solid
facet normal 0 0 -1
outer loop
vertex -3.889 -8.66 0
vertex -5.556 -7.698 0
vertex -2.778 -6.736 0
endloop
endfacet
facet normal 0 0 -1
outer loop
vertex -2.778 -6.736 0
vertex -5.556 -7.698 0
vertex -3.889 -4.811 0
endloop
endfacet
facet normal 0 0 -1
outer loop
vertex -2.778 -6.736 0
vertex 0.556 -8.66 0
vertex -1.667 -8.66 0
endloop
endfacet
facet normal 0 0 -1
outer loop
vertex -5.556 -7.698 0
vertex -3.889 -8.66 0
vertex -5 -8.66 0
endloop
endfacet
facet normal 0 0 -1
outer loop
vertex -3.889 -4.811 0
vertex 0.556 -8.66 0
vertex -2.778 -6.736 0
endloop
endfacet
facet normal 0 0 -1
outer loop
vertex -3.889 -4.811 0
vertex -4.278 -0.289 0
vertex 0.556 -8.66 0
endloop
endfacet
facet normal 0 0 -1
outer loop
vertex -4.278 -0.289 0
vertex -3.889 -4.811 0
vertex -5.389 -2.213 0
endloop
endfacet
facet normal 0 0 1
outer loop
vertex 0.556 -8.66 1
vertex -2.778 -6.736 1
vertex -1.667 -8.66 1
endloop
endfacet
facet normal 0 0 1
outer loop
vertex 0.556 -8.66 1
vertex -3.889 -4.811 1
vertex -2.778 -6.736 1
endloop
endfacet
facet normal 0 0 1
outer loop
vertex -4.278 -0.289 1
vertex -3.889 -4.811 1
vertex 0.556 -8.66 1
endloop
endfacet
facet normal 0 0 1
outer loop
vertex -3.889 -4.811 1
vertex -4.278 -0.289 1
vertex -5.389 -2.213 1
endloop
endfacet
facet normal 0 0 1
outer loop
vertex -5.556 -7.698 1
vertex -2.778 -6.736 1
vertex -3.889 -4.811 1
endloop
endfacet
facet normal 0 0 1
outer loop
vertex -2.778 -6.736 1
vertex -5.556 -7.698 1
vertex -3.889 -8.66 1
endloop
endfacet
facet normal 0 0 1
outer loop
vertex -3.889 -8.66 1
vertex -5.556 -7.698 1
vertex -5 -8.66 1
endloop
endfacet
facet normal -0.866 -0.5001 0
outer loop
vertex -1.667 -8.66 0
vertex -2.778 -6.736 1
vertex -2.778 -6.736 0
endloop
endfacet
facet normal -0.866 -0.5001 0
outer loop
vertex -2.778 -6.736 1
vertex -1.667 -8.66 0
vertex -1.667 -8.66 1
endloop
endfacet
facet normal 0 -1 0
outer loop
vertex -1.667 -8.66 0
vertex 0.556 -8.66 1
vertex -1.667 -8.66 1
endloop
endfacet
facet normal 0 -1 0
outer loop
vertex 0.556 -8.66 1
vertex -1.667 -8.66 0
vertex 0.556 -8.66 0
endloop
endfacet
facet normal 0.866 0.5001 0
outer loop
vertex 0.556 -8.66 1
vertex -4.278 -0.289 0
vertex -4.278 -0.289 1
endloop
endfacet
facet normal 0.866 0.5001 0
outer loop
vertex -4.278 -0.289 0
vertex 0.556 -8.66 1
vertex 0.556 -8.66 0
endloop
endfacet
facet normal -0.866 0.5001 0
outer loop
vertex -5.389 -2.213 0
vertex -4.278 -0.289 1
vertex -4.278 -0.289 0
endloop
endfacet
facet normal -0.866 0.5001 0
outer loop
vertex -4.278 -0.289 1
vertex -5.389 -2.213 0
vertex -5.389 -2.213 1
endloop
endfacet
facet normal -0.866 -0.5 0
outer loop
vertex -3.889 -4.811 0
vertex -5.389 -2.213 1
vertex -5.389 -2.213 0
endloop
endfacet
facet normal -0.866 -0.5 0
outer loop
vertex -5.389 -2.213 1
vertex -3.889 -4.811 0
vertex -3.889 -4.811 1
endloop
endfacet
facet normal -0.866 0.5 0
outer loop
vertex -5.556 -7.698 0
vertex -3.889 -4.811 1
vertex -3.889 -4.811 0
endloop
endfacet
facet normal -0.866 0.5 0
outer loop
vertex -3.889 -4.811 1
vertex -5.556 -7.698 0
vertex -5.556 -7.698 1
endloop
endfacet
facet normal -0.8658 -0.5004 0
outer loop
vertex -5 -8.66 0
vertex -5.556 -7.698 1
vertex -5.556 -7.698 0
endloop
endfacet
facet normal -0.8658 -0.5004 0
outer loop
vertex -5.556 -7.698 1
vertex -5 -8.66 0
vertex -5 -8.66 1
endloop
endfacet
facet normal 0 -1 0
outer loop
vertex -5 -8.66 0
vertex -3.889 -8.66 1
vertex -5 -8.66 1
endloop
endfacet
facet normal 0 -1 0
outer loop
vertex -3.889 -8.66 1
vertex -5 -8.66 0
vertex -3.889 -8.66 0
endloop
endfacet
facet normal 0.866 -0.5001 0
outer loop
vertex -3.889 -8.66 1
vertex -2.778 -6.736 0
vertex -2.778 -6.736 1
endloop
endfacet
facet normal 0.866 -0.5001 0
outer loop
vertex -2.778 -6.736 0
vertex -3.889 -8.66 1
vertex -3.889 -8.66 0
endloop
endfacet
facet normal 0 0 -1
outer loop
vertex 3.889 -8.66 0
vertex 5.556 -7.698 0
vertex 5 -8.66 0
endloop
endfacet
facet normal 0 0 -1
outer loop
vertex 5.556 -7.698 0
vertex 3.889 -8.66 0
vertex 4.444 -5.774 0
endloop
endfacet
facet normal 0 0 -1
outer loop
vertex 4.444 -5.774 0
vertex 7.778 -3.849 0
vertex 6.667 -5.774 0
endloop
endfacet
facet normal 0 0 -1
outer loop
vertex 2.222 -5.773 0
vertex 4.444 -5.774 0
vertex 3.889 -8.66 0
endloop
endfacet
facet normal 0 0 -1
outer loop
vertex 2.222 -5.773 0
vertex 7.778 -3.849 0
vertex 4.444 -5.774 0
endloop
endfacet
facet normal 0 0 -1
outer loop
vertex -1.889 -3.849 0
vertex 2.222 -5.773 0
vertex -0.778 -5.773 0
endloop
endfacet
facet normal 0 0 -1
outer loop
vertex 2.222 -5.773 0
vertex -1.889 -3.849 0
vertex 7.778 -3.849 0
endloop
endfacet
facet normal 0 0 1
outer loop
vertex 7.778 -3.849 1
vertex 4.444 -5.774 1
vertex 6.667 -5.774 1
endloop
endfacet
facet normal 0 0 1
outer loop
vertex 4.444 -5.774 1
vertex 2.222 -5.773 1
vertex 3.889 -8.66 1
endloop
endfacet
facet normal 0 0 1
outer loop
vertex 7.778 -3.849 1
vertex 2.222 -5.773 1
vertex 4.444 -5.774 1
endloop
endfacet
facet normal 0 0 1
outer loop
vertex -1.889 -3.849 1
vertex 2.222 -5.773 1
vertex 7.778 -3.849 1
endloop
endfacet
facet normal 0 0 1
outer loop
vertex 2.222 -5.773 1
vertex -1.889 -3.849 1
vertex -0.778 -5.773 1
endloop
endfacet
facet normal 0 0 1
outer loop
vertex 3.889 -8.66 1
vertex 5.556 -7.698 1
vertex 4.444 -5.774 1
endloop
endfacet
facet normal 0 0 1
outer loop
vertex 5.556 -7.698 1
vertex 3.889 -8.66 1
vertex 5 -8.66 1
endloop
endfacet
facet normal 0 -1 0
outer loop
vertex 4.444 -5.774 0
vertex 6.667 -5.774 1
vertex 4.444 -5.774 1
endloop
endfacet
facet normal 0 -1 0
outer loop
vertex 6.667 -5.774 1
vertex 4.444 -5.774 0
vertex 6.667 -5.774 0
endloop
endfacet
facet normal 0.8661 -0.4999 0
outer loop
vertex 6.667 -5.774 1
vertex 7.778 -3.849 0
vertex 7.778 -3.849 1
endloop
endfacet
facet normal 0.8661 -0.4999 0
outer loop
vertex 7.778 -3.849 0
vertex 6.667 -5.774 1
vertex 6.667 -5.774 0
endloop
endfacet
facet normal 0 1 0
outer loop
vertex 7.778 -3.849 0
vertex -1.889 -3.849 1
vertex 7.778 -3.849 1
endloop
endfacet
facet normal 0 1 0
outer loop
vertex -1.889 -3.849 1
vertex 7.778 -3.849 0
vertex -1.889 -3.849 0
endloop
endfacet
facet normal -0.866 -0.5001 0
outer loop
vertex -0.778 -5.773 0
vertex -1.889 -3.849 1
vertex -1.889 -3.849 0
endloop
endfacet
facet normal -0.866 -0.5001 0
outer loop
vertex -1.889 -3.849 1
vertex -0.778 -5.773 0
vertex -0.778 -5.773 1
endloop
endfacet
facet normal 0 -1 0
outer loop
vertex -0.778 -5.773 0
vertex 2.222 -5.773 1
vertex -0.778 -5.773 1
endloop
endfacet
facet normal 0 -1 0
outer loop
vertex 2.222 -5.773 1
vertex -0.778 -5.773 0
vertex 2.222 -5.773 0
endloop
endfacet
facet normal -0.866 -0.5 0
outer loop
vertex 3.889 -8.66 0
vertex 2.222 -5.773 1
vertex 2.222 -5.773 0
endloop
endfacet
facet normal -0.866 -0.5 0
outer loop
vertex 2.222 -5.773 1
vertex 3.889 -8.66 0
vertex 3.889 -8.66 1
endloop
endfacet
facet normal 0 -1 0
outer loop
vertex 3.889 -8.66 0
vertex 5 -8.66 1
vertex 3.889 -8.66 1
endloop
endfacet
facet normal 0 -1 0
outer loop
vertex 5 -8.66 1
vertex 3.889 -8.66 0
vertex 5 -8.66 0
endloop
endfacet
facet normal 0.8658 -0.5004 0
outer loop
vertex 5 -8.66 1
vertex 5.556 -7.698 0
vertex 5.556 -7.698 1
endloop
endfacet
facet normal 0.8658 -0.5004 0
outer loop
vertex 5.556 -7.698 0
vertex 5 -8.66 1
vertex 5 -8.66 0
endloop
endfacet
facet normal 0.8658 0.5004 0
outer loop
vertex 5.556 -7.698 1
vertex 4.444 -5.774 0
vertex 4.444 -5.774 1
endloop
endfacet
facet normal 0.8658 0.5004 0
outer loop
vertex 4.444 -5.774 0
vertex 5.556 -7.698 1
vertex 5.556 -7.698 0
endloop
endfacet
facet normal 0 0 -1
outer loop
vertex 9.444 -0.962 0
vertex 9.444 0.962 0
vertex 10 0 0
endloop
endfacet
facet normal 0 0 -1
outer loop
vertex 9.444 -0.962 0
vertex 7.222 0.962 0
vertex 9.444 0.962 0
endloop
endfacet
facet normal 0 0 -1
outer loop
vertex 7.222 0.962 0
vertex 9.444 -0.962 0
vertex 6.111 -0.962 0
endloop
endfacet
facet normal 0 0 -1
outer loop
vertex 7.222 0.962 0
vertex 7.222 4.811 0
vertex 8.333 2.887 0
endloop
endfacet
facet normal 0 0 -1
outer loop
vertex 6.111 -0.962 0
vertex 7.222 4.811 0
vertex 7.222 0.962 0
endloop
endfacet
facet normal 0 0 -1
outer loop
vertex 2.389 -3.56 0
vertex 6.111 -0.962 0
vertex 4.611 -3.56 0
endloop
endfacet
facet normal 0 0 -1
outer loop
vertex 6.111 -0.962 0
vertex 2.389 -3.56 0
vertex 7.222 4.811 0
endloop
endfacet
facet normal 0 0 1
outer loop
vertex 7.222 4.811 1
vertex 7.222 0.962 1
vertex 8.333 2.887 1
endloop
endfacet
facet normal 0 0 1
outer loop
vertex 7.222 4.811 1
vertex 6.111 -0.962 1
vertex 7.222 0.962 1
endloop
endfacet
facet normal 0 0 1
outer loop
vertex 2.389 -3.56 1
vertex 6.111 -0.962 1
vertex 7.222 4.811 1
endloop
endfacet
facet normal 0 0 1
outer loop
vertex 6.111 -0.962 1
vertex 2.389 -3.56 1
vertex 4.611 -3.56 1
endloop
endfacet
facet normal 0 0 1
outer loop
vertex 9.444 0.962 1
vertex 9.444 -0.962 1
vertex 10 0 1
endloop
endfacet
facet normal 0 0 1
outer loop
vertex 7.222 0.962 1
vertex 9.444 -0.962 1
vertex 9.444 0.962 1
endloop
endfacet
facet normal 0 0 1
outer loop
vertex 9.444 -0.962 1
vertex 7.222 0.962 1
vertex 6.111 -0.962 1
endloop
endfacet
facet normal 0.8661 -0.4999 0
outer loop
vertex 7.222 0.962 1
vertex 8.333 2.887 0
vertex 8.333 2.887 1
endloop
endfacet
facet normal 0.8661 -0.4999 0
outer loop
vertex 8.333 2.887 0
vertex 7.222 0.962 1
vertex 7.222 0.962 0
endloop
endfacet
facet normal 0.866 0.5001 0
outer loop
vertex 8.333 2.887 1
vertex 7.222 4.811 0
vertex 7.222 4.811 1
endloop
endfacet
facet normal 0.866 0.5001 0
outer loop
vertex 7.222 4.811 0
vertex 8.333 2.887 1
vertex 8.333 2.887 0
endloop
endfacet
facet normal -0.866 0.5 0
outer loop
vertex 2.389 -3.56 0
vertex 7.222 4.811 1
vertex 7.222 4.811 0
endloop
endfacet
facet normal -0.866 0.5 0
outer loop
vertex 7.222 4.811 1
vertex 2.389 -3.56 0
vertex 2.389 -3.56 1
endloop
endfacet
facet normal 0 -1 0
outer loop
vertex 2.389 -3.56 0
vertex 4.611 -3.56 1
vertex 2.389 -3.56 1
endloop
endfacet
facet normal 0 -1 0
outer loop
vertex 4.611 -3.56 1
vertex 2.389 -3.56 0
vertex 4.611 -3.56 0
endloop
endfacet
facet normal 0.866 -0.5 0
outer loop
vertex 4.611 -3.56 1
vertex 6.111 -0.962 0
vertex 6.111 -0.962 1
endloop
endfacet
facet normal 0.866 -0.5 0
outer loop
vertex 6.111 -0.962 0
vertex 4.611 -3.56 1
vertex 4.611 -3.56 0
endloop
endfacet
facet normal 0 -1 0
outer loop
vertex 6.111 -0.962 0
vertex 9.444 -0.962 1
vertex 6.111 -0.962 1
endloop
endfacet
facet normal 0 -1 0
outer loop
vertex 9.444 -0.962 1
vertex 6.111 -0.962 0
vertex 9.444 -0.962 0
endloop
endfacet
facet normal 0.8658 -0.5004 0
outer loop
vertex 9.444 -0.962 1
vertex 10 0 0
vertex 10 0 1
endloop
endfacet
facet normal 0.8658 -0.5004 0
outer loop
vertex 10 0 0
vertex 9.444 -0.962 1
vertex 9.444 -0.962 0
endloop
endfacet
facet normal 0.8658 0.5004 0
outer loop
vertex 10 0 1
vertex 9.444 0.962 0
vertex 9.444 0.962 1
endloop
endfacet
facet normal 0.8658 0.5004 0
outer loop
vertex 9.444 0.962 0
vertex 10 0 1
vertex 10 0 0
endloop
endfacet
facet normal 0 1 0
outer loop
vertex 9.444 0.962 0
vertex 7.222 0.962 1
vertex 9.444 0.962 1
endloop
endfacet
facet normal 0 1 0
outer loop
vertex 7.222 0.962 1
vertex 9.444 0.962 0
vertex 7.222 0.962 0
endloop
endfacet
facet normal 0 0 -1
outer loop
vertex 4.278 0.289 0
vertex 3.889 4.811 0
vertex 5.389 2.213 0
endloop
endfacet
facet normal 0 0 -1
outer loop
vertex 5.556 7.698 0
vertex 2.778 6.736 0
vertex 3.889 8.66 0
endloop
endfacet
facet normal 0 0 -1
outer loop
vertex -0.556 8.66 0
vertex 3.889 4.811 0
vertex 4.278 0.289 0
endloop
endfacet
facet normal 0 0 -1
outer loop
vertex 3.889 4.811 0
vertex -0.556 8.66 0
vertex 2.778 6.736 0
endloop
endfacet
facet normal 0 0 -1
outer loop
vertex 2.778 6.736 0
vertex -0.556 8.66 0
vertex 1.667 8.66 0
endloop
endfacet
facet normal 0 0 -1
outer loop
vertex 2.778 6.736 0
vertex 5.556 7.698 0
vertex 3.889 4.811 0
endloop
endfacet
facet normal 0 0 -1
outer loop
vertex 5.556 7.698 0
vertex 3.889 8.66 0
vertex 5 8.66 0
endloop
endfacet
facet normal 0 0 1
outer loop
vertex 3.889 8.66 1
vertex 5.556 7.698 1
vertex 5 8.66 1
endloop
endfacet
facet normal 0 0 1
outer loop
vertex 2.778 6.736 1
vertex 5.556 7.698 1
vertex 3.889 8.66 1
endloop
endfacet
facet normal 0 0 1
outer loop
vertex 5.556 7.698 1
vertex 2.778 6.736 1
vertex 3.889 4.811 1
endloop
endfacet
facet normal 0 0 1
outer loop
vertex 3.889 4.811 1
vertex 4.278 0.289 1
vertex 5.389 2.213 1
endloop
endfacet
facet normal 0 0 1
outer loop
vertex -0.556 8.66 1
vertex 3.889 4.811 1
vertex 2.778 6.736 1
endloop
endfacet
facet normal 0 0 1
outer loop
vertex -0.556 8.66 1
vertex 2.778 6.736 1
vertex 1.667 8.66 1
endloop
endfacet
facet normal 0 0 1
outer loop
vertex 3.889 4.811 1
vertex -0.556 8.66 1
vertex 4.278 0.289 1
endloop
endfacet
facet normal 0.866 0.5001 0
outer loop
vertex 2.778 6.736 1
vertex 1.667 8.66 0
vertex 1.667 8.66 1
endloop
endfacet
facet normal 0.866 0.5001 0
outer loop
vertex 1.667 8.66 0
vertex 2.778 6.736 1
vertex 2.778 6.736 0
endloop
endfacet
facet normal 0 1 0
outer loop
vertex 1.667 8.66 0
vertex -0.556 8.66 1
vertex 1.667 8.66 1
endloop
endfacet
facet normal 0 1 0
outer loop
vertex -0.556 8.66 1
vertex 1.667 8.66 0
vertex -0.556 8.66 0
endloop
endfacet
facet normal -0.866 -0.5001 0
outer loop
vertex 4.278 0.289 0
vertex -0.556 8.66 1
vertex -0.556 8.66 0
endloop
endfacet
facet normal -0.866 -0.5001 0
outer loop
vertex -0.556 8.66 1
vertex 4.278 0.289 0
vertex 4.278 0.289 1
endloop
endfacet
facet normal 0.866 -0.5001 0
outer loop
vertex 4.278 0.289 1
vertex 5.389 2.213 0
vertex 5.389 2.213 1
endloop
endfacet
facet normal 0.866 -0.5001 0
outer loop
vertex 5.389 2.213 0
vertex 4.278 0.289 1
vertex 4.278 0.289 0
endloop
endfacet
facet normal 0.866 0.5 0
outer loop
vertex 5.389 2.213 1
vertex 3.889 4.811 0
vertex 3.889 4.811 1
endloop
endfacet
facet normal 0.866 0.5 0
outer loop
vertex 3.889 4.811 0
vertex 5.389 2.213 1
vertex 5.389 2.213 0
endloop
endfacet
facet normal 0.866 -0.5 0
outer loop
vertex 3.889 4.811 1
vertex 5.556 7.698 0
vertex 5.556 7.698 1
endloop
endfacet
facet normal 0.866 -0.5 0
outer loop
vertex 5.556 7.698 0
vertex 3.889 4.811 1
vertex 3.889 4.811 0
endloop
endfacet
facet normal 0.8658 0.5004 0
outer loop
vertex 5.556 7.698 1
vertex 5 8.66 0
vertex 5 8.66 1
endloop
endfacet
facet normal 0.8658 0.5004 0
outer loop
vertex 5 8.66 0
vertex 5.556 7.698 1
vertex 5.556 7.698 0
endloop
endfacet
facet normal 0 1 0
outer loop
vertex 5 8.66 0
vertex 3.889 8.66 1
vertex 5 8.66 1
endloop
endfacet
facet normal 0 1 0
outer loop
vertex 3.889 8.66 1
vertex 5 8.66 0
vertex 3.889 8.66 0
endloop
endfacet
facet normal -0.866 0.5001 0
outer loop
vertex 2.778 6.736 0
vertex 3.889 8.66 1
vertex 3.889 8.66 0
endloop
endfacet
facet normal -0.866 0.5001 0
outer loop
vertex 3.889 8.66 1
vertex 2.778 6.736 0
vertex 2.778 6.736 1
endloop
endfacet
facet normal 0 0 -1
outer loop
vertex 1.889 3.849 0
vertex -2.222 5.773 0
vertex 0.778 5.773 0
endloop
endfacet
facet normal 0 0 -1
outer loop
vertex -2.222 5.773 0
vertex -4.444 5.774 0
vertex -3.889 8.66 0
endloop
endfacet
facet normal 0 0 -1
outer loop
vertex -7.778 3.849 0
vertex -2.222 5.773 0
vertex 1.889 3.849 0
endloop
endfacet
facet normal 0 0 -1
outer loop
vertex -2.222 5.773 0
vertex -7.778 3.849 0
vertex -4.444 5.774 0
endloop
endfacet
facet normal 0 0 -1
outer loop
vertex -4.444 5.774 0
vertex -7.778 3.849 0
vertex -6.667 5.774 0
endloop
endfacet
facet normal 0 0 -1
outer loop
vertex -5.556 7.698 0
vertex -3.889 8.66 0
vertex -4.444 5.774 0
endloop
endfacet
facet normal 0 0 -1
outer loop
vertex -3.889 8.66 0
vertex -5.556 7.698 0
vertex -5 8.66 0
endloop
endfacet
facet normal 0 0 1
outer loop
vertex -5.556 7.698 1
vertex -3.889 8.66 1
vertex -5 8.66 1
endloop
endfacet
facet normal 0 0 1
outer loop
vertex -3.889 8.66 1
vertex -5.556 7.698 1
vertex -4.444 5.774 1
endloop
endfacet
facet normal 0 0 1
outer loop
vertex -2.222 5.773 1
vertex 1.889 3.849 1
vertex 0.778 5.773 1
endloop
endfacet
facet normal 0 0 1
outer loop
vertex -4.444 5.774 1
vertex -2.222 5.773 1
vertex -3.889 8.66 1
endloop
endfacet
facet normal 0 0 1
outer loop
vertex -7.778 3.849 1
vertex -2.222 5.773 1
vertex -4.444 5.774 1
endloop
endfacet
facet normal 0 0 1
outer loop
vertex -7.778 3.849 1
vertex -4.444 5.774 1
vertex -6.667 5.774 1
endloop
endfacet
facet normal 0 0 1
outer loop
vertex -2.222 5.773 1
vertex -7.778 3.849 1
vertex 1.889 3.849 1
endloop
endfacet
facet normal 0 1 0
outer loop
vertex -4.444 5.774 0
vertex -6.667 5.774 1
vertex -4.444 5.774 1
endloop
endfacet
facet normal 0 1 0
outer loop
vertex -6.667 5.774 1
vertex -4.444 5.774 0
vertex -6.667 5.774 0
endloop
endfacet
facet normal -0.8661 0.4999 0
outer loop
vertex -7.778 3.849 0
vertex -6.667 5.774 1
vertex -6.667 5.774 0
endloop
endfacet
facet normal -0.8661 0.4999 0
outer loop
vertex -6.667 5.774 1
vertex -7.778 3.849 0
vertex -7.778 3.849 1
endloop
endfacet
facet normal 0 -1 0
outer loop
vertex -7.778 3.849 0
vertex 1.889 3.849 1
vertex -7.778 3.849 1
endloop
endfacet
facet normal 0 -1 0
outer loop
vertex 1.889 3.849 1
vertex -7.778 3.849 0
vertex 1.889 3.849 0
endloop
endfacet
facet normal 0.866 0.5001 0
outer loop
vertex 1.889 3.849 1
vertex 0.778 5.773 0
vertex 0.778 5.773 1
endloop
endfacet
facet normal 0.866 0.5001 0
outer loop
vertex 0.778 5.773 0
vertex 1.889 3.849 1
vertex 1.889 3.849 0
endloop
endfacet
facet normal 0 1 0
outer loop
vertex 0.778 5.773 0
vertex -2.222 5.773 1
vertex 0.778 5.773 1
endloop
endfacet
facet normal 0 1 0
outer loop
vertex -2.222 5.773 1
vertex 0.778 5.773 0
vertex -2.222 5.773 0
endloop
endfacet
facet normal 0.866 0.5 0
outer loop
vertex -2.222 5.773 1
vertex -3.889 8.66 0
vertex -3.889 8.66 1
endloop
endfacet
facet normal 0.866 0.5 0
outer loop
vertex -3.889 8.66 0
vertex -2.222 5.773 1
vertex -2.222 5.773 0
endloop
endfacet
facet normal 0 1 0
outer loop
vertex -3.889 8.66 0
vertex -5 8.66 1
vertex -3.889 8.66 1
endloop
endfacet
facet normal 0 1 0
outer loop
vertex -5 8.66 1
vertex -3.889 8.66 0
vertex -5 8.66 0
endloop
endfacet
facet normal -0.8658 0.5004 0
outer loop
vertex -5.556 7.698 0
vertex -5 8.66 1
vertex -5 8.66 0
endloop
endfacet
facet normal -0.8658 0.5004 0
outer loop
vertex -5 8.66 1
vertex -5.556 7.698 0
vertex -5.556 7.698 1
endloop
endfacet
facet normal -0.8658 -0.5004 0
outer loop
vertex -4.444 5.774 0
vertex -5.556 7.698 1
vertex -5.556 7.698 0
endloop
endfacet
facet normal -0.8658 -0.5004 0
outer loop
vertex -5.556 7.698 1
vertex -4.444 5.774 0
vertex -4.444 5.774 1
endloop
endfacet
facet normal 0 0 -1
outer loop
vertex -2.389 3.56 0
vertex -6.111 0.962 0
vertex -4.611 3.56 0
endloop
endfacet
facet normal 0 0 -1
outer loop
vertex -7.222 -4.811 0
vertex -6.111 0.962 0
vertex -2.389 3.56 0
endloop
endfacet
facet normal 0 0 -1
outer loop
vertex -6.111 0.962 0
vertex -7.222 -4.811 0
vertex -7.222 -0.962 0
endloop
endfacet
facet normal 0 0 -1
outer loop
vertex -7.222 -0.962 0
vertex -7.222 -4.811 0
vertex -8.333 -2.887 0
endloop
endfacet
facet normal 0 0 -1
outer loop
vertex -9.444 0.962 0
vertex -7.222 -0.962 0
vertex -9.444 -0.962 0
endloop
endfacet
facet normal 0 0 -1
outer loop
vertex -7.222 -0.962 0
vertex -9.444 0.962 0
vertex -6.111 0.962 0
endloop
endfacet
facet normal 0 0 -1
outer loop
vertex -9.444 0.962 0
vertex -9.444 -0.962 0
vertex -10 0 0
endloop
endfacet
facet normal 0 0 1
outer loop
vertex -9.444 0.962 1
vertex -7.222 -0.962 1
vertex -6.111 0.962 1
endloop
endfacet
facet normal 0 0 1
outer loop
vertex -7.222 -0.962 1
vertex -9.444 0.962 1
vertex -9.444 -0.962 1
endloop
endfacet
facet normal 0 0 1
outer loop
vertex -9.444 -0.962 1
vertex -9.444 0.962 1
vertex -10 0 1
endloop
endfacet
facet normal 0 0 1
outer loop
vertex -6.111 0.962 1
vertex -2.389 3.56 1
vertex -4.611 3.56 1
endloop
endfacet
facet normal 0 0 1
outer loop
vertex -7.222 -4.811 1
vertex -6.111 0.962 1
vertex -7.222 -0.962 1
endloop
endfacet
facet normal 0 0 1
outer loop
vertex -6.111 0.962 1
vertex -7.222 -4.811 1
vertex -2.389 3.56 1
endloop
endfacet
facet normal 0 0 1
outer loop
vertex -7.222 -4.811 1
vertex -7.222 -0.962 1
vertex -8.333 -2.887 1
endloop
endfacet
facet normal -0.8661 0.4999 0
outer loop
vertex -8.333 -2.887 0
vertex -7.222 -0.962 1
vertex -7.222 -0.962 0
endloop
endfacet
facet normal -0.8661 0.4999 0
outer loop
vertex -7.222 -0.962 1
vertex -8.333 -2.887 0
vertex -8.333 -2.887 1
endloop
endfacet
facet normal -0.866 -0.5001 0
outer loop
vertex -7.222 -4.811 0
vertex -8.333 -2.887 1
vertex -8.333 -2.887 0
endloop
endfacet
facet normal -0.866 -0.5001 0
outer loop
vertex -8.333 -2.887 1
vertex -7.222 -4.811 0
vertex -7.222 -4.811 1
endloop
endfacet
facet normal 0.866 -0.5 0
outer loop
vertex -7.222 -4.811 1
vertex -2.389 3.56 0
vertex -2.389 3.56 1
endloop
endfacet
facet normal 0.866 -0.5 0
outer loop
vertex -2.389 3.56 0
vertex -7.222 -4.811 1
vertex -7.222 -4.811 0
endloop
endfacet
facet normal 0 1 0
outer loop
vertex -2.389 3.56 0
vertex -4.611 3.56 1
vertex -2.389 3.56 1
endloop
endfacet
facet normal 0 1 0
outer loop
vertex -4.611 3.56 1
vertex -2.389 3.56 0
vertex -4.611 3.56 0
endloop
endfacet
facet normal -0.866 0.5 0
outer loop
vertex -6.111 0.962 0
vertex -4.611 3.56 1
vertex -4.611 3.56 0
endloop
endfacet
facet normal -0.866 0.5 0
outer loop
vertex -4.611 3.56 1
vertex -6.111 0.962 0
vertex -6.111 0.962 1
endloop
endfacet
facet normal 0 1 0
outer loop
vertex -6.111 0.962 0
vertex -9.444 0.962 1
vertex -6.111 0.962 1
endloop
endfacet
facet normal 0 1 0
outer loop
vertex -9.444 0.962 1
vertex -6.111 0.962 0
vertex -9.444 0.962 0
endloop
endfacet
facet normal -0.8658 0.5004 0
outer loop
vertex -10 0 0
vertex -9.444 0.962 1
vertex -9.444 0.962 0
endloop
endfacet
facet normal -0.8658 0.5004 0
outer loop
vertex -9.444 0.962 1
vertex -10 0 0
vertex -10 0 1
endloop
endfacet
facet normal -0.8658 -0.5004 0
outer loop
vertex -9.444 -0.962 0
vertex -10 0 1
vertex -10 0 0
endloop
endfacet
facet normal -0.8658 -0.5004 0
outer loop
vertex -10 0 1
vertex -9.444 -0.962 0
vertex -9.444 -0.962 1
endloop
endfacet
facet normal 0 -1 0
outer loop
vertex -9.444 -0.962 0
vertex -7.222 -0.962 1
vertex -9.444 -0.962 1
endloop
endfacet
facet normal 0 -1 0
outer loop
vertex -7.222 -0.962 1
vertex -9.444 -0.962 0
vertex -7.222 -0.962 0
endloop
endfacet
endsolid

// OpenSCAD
unit = [1, 0];
origin = [0, 0];


/*
    Returns a 2D rotation matrix given an angle.
*/
function rot2d(angle) = [
    [+cos(angle), -sin(angle)],
    [+sin(angle), +cos(angle)]
];


/*
    Calculates the points for a hexagon.
    Used to reference off of for creating the lambda.
    Points are created starting from the right and moving counter-clockwise.

         2   1

      3         0

         4   5
*/
function inner_hex_points(data) = [
    for (angle = [0 : 60 : 300]) 
    dict_get(data, "scale") * rot2d(angle) * unit
];



/*
    Calculates the points for making a lambda.

    Returns two a list of two lists.
    The first list contains the offset for making a flake.
    The second list is used to form the lambda polygon.
*/
function lambda_points(data) =
let (
    hex_points = inner_hex_points(data),
    thickness = dict_get(data, "thickness") / 2,
    top_left = hex_points[2],
    bottom_left = hex_points[4],
    bottom_right = hex_points[5],
    v_0 = thickness * unit,
    v_p60 = thickness * rot2d(60) * unit,
    v_n60 = thickness * rot2d(-60) * unit,
    v_n90 = thickness * rot2d(-90) * unit,
    gap = dict_get(data, "gap") * rot2d(-60) * unit
)
[
    [
        top_left + v_p60,
    ],
    [
        top_left - v_p60 + gap,
        top_left + v_p60 + gap,
        bottom_right + v_0,
        bottom_right - v_0,
        sqrt(3) * v_n90,
        bottom_left + v_0,
        bottom_left,
        bottom_left - v_n60,
        -v_0
    ]
];


/*
    Generates a single lambda at the origin.
*/
module lambda(data) {
    new_data = update_params(data);
    linear_extrude(dict_get(new_data, "height"))
    polygon(lambda_points(new_data)[1]);
}


/*
    Generates a NixOS flake.
*/
module flake(data) {
    new_data = update_params(data);
    for (idx = [0 : 5]) {
        rotate([0, 0, idx * 60]) 
        translate(-lambda_points(new_data)[0][0])
        translate([-dict_get(new_data, "scale"), 0, 0])
        linear_extrude(dict_get(new_data, "height"))
        polygon(lambda_points(new_data)[1]);
    }
}


/*
    Returns the value from a associative array/dictionary type structure given some key.

    Values can be of any type.
    The dictionary must of be of the form:
    [
        [ "key0", <value0> ],
        [ "key1", <value1> ],
        ...
    ]
*/
function dict_get(dict, key) =
  dict[search([key], dict)[0]][1];


/*
    Updates the user parameters so the flake is unit size when `scale = 1`.
*/
function update_params(data) = let
    // factor was empirically found. It gives a flake that is circumscribed by the unit circle.
    (factor = 2.25) [
    [ "gap", 0.75 * dict_get(data, "scale") * dict_get(data, "gap") / factor ],
    [ "height", dict_get(data, "height") ],
    [ "scale", dict_get(data, "scale") / factor ],
    [ "thickness", dict_get(data, "scale") * dict_get(data, "thickness") / factor ],
];


/*
    The parameters for generating a NixOS flake.

    `gap` - The gap between lambdas.
    `height` - The z-height of the flake.
    `scale` - The radial (x,y) size of the flake.
    `thickness` - The thickness of the lambda legs.

    `scale` updates `gap` and `thickness` so there is no need to compesate these values.
    A `gap` of 0 will leave no gap between the lambdas.
    A `gap` of 1 will remove the top portion of the long lambda leg until the point where the two lambda legs intersect.

    A `gap` of 0.05 to 0.15 is a good value for replicating the official NixOS flake.
    A `thickness` of 0.5 is a good value for replicating the official NixOS flake.
    OpenSCAD doesn't have a concept of units so use `scale` and `height` values in the desired ratio.
*/
params = [
    [ "gap", 0.1 ],
    [ "height", 1 ],
    [ "scale", 10 ],
    [ "thickness", 0.5 ],
];


flake(params);
